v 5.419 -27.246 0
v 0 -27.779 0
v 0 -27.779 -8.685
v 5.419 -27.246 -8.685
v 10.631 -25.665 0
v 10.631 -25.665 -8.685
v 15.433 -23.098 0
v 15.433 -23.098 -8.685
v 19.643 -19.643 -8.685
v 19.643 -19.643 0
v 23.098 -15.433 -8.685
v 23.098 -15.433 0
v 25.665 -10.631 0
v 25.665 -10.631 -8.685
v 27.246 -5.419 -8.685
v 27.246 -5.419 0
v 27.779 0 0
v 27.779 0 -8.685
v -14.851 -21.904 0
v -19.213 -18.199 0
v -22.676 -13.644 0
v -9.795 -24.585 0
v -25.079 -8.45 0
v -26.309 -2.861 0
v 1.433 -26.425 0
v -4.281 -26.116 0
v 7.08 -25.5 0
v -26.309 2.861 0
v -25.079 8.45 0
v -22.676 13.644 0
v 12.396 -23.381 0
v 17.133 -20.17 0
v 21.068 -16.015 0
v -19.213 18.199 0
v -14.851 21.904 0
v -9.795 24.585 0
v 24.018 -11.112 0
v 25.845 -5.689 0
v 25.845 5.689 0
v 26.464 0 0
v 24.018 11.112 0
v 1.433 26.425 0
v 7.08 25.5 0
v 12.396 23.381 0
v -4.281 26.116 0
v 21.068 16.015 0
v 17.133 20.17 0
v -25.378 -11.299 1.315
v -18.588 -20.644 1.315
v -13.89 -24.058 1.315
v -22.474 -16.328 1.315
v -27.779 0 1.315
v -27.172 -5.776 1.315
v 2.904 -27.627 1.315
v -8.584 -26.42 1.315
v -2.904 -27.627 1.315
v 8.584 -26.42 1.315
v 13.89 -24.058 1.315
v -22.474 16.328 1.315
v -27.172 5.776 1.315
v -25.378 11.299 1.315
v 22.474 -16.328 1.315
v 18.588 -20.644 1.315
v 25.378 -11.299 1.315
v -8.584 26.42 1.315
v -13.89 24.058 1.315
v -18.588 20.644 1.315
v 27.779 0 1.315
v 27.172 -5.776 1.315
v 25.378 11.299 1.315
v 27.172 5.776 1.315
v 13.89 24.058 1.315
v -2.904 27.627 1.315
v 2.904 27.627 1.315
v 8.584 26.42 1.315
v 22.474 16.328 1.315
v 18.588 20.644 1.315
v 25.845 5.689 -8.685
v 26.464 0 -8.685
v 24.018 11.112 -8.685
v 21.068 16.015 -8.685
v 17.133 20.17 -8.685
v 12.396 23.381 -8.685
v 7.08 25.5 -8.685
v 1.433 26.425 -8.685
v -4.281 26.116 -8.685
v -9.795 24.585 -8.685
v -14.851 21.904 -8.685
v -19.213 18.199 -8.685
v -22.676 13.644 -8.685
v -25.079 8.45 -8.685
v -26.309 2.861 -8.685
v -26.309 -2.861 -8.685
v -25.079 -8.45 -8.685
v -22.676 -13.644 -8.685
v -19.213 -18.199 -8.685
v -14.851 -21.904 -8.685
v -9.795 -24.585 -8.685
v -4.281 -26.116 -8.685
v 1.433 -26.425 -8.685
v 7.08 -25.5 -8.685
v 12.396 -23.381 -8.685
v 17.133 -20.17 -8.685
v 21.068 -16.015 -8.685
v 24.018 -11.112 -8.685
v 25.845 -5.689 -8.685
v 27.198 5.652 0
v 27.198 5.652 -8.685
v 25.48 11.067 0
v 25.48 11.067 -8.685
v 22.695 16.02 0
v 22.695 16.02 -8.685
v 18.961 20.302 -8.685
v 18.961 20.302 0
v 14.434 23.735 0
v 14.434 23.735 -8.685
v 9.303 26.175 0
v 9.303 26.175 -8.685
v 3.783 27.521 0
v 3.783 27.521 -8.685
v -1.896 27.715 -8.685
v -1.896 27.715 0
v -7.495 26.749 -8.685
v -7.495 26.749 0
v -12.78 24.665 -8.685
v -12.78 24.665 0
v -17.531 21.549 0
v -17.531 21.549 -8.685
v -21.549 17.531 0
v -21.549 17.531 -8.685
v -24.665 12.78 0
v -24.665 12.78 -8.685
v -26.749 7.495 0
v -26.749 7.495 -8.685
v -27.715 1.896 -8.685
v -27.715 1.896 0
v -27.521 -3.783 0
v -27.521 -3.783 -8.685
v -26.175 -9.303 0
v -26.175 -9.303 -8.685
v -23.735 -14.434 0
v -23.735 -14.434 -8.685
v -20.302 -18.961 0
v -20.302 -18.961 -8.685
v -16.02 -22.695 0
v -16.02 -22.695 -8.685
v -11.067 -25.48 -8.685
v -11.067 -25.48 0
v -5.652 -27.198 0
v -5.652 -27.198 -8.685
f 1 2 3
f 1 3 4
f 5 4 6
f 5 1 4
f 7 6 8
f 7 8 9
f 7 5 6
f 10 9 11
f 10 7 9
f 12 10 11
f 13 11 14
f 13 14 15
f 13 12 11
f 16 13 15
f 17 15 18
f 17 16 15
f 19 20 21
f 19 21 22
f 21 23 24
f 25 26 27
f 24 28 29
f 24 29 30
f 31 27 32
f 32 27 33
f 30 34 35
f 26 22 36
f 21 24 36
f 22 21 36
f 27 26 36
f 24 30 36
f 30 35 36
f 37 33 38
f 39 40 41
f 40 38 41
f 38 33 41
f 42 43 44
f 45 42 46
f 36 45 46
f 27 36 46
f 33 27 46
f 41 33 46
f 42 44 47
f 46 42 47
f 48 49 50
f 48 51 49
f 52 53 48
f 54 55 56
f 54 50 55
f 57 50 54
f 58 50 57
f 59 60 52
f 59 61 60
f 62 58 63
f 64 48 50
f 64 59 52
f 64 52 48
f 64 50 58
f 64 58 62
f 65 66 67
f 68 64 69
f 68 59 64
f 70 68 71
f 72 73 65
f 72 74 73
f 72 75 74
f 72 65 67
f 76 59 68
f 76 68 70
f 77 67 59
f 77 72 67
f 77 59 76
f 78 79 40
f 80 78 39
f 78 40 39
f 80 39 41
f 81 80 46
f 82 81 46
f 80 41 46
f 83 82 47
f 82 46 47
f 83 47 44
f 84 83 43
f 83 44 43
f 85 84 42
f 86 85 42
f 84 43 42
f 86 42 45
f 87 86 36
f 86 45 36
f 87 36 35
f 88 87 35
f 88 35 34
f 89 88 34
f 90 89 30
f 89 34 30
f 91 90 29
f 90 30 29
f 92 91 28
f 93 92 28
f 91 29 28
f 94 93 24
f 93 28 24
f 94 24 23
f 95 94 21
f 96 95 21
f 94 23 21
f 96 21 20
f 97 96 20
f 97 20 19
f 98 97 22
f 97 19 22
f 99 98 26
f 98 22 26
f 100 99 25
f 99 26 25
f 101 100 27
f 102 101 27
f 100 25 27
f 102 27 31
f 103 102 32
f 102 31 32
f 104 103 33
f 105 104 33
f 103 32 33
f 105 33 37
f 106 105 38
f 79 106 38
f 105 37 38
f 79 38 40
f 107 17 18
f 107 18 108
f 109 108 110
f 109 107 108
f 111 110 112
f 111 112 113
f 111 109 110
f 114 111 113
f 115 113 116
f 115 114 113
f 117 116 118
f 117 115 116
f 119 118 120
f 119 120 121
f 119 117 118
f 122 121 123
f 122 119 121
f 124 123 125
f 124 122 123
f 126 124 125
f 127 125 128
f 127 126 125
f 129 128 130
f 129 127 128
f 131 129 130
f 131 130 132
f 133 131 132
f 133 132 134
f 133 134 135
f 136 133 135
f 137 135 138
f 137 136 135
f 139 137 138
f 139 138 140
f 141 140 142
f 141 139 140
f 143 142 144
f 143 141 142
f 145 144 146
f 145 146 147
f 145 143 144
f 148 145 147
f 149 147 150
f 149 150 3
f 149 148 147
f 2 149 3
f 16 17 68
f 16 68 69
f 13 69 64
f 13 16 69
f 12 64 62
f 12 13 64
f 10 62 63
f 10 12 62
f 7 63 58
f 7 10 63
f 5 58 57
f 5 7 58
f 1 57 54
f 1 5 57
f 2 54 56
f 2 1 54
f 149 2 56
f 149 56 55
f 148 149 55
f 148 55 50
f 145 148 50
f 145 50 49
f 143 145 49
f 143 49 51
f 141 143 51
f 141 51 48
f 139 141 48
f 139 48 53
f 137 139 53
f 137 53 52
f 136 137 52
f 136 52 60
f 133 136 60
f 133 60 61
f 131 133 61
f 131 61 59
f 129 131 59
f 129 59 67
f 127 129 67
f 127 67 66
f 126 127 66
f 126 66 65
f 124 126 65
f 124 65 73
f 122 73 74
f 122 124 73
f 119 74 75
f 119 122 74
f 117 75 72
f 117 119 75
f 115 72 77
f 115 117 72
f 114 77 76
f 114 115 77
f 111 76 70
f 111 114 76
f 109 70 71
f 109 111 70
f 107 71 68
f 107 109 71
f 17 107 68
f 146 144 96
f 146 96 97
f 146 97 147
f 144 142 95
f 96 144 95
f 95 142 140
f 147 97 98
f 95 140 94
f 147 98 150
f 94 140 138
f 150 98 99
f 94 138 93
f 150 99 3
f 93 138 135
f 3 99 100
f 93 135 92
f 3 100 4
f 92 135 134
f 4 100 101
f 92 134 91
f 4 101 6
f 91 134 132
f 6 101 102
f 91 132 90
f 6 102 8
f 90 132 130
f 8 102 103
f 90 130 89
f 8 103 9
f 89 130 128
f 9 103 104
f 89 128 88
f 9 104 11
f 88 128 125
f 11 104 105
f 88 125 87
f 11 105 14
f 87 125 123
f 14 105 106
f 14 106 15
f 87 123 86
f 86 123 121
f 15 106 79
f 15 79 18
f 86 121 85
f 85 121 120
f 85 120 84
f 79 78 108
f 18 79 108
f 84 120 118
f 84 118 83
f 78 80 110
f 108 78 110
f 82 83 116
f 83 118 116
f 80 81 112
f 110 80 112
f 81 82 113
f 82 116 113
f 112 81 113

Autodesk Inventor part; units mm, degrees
ref_plane "YZ Plane" through (0, 0, 0) normal (1, 0, 0) x (0, 1, 0)
ref_plane "XZ Plane" through (0, 0, 0) normal (0, 1, 0) x (-1, 0, 0)
ref_plane "XY Plane" through (0, 0, 0) normal (0, 0, 1) x (1, 0, 0)
sketch "Sketch1" plane through (0, 0, 0) normal (0, 0, 1) x (1, 0, 0)
  circle A0 centre (0, 0) radius 27.7794
  line L0 (-15.1761, -27.7794) -> (15.5731, -27.7794)
  circle A1 centre (0, 0) radius 26.4642
  dimension "d13" = 55.5588
  dimension "SupportThickness" = 1.3152
extrude "Extrusion1" add sketch "Sketch1" along normal blind 1.3152 contours A0 | A1
extrude "Extrusion3" add sketch "Sketch1" against normal blind 8.6848
equation "\"d13\" = 1.1 * CrucibleOuterDiameter"
equation "\"d1\" = SupportThickness"
equation "\"d15\" = SupportHeight - SupportThickness"
equation "\"CrucibleOuterDiameter\" = 50.508"
equation "\"SupportHeight\" = 10"
properties part number "crucible_support"
